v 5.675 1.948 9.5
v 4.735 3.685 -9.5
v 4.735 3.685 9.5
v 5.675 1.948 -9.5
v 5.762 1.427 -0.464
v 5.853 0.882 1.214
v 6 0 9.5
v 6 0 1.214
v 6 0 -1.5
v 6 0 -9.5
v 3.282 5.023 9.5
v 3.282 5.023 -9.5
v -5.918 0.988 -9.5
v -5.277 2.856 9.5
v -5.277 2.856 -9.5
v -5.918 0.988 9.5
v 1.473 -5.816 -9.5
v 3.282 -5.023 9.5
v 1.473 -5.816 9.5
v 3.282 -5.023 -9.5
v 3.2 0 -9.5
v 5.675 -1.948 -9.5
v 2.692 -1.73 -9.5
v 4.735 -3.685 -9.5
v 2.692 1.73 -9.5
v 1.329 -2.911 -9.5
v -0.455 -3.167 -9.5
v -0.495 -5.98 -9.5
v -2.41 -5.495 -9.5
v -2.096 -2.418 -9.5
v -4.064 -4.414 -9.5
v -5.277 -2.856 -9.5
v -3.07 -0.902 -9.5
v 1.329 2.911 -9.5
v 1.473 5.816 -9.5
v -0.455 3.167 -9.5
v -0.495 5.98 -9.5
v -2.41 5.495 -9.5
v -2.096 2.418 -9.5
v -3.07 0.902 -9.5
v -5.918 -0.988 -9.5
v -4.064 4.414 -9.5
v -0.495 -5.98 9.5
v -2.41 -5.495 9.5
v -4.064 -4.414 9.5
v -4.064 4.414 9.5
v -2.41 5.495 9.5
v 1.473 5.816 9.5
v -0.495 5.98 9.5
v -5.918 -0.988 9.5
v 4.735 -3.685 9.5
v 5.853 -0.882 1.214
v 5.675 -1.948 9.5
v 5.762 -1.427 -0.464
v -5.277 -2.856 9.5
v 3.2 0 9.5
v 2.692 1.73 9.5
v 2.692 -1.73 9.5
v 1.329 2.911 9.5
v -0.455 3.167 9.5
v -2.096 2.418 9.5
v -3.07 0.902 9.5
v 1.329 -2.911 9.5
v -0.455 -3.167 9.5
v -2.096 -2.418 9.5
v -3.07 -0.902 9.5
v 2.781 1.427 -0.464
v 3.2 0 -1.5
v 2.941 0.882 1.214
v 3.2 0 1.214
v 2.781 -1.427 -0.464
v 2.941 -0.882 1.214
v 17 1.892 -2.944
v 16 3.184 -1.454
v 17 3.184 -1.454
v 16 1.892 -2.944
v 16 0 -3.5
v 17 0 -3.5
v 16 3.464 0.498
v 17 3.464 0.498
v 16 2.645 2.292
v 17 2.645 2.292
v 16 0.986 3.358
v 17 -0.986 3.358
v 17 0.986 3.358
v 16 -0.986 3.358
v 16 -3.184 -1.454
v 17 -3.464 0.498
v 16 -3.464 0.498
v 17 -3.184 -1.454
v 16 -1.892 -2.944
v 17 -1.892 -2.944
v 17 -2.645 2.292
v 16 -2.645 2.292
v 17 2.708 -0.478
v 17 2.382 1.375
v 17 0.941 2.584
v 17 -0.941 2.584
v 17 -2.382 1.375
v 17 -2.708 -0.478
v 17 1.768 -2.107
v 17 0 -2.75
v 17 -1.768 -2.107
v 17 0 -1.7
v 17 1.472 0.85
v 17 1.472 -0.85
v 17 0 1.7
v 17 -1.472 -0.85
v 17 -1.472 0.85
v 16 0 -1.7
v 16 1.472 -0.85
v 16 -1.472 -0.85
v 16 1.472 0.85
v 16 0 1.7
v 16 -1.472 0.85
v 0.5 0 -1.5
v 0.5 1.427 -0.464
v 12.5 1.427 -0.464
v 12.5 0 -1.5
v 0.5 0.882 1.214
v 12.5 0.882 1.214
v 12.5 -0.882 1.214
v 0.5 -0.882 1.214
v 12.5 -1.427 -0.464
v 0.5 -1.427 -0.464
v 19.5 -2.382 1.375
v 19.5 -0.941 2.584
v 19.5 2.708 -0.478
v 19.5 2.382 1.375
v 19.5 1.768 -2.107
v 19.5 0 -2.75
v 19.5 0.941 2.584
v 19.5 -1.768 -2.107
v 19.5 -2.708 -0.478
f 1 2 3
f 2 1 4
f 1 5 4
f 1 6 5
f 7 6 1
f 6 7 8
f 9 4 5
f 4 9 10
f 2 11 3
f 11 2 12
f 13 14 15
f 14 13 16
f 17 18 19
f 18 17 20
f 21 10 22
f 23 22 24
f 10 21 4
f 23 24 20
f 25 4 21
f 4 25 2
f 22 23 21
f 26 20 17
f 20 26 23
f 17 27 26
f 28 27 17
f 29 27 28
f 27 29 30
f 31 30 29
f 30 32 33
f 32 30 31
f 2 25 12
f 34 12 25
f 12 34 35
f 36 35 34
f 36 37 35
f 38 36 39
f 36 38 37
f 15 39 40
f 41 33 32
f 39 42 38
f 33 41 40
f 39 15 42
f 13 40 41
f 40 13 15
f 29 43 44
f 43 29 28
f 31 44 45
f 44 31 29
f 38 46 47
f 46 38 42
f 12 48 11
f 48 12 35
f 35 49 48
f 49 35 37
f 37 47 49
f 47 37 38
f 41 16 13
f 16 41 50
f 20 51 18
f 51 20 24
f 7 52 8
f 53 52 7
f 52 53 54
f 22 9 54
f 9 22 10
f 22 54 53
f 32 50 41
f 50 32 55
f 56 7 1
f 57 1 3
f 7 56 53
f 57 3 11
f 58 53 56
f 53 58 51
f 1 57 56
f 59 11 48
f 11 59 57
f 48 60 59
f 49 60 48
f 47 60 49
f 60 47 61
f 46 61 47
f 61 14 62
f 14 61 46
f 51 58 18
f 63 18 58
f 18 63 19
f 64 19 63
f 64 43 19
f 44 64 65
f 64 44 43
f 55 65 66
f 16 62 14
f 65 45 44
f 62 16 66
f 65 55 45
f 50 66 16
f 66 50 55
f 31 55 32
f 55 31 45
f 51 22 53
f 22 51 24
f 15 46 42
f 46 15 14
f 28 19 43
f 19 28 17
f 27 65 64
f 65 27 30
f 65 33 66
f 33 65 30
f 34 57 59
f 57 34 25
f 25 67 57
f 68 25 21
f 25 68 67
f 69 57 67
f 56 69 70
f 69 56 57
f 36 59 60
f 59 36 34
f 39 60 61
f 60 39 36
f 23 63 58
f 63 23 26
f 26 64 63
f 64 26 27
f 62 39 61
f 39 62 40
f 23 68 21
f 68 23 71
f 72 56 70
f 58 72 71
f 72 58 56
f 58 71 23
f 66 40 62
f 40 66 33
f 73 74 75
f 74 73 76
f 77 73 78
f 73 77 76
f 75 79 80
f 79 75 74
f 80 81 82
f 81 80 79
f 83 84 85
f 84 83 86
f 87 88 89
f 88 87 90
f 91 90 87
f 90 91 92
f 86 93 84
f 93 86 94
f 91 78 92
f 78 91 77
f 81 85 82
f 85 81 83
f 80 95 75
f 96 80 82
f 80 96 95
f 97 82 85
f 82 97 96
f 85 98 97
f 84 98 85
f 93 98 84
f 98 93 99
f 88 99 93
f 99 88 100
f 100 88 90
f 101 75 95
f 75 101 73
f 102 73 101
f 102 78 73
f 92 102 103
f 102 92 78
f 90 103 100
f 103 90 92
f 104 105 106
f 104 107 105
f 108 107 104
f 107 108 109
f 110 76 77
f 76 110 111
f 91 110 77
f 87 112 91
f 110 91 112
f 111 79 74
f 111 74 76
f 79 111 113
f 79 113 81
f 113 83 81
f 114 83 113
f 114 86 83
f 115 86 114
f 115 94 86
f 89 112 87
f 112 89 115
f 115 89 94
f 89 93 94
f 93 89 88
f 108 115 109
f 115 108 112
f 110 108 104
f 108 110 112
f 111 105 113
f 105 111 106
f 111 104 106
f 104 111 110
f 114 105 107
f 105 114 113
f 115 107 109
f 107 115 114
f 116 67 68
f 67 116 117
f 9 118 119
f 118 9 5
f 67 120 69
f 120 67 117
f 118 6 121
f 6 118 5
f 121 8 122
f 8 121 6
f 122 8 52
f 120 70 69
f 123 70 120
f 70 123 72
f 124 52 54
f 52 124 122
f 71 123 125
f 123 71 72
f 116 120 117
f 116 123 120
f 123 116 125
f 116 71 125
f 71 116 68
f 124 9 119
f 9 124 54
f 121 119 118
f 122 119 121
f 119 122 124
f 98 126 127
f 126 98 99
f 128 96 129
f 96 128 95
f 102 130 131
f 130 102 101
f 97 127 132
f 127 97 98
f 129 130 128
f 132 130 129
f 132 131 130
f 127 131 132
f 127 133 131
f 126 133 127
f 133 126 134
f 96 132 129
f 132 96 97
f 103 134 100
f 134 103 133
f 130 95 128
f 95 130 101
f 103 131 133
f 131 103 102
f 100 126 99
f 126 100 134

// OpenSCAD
// Parameters
bore_diameter_mm = 6; //[3:12:0.1]
outer_diameter_mm = 12; //[6:24:0.1]
length_mm = 19; //[10:40:0.1]
bore_radius_mm = 3; //[1.5:6:0.1]
outer_radius_mm = 6; //[3:12:0.1]
eps_mm = 0.2; //[0.05:0.5:0.05]
overlap_mm = 1; //[0.5:2:0.1]
enable_end_seals = 1; //[0:1:1]
seal_radial_thickness_mm = 0.8; //[0.4:1.6:0.1]
seal_axial_thickness_mm = 1.2; //[0.6:2.4:0.1]
screw_shank_diameter_mm = 3; //[2:6:0.1]
screw_length_mm = 12; //[6:30:0.5]
screw_head_diameter_mm = 5.5; //[4:10:0.1]
screw_head_height_mm = 2.5; //[1.5:5:0.1]
washer_outer_diameter_mm = 7; //[5:14:0.1]
washer_thickness_mm = 1; //[0.5:2.5:0.1]

// Linear Bearing - complete geometry
module linear_bearing() {
  color("Silver") {
    // Outer casing
    difference() {
      cylinder(h=length_mm, r=outer_radius_mm, center=true);
      // Inner bore
      translate([0, 0, 0])
        cylinder(h=length_mm + 2*eps_mm, r=bore_radius_mm + eps_mm, center=true);
    }
    // End seals
    if (enable_end_seals) {
      union() {
        // Left seal
        translate([0, 0, -length_mm/2 + seal_axial_thickness_mm/2])
          difference() {
            cylinder(h=seal_axial_thickness_mm, r=bore_radius_mm + seal_radial_thickness_mm, center=true);
            cylinder(h=seal_axial_thickness_mm + 2*eps_mm, r=bore_radius_mm + eps_mm, center=true);
          }
        // Right seal
        translate([0, 0, length_mm/2 - seal_axial_thickness_mm/2])
          difference() {
            cylinder(h=seal_axial_thickness_mm, r=bore_radius_mm + seal_radial_thickness_mm, center=true);
            cylinder(h=seal_axial_thickness_mm + 2*eps_mm, r=bore_radius_mm + eps_mm, center=true);
          }
      }
    }
  }
}

// Screw and Washer - complete geometry
module screw_and_washer() {
  color("DimGray") {
    // Screw shank
    translate([outer_radius_mm + screw_shank_diameter_mm/2 - overlap_mm, 0, 0])
      rotate([0, 90, 0])
      cylinder(h=screw_length_mm, r=screw_shank_diameter_mm/2, center=true);
    // Screw head
    translate([outer_radius_mm + screw_length_mm + screw_head_height_mm/2 - overlap_mm, 0, 0])
      rotate([0, 90, 0])
      cylinder(h=screw_head_height_mm, r=screw_head_diameter_mm/2, center=true);
    // Washer
    translate([outer_radius_mm + screw_length_mm - washer_thickness_mm/2 - overlap_mm, 0, 0])
      rotate([0, 90, 0])
      difference() {
        cylinder(h=washer_thickness_mm, r=washer_outer_diameter_mm/2, center=true);
        cylinder(h=washer_thickness_mm + 2*eps_mm, r=screw_shank_diameter_mm/2 + eps_mm, center=true);
      }
  }
}

// Assembly
module assembly() {
  linear_bearing();
  screw_and_washer();
}

assembly();
